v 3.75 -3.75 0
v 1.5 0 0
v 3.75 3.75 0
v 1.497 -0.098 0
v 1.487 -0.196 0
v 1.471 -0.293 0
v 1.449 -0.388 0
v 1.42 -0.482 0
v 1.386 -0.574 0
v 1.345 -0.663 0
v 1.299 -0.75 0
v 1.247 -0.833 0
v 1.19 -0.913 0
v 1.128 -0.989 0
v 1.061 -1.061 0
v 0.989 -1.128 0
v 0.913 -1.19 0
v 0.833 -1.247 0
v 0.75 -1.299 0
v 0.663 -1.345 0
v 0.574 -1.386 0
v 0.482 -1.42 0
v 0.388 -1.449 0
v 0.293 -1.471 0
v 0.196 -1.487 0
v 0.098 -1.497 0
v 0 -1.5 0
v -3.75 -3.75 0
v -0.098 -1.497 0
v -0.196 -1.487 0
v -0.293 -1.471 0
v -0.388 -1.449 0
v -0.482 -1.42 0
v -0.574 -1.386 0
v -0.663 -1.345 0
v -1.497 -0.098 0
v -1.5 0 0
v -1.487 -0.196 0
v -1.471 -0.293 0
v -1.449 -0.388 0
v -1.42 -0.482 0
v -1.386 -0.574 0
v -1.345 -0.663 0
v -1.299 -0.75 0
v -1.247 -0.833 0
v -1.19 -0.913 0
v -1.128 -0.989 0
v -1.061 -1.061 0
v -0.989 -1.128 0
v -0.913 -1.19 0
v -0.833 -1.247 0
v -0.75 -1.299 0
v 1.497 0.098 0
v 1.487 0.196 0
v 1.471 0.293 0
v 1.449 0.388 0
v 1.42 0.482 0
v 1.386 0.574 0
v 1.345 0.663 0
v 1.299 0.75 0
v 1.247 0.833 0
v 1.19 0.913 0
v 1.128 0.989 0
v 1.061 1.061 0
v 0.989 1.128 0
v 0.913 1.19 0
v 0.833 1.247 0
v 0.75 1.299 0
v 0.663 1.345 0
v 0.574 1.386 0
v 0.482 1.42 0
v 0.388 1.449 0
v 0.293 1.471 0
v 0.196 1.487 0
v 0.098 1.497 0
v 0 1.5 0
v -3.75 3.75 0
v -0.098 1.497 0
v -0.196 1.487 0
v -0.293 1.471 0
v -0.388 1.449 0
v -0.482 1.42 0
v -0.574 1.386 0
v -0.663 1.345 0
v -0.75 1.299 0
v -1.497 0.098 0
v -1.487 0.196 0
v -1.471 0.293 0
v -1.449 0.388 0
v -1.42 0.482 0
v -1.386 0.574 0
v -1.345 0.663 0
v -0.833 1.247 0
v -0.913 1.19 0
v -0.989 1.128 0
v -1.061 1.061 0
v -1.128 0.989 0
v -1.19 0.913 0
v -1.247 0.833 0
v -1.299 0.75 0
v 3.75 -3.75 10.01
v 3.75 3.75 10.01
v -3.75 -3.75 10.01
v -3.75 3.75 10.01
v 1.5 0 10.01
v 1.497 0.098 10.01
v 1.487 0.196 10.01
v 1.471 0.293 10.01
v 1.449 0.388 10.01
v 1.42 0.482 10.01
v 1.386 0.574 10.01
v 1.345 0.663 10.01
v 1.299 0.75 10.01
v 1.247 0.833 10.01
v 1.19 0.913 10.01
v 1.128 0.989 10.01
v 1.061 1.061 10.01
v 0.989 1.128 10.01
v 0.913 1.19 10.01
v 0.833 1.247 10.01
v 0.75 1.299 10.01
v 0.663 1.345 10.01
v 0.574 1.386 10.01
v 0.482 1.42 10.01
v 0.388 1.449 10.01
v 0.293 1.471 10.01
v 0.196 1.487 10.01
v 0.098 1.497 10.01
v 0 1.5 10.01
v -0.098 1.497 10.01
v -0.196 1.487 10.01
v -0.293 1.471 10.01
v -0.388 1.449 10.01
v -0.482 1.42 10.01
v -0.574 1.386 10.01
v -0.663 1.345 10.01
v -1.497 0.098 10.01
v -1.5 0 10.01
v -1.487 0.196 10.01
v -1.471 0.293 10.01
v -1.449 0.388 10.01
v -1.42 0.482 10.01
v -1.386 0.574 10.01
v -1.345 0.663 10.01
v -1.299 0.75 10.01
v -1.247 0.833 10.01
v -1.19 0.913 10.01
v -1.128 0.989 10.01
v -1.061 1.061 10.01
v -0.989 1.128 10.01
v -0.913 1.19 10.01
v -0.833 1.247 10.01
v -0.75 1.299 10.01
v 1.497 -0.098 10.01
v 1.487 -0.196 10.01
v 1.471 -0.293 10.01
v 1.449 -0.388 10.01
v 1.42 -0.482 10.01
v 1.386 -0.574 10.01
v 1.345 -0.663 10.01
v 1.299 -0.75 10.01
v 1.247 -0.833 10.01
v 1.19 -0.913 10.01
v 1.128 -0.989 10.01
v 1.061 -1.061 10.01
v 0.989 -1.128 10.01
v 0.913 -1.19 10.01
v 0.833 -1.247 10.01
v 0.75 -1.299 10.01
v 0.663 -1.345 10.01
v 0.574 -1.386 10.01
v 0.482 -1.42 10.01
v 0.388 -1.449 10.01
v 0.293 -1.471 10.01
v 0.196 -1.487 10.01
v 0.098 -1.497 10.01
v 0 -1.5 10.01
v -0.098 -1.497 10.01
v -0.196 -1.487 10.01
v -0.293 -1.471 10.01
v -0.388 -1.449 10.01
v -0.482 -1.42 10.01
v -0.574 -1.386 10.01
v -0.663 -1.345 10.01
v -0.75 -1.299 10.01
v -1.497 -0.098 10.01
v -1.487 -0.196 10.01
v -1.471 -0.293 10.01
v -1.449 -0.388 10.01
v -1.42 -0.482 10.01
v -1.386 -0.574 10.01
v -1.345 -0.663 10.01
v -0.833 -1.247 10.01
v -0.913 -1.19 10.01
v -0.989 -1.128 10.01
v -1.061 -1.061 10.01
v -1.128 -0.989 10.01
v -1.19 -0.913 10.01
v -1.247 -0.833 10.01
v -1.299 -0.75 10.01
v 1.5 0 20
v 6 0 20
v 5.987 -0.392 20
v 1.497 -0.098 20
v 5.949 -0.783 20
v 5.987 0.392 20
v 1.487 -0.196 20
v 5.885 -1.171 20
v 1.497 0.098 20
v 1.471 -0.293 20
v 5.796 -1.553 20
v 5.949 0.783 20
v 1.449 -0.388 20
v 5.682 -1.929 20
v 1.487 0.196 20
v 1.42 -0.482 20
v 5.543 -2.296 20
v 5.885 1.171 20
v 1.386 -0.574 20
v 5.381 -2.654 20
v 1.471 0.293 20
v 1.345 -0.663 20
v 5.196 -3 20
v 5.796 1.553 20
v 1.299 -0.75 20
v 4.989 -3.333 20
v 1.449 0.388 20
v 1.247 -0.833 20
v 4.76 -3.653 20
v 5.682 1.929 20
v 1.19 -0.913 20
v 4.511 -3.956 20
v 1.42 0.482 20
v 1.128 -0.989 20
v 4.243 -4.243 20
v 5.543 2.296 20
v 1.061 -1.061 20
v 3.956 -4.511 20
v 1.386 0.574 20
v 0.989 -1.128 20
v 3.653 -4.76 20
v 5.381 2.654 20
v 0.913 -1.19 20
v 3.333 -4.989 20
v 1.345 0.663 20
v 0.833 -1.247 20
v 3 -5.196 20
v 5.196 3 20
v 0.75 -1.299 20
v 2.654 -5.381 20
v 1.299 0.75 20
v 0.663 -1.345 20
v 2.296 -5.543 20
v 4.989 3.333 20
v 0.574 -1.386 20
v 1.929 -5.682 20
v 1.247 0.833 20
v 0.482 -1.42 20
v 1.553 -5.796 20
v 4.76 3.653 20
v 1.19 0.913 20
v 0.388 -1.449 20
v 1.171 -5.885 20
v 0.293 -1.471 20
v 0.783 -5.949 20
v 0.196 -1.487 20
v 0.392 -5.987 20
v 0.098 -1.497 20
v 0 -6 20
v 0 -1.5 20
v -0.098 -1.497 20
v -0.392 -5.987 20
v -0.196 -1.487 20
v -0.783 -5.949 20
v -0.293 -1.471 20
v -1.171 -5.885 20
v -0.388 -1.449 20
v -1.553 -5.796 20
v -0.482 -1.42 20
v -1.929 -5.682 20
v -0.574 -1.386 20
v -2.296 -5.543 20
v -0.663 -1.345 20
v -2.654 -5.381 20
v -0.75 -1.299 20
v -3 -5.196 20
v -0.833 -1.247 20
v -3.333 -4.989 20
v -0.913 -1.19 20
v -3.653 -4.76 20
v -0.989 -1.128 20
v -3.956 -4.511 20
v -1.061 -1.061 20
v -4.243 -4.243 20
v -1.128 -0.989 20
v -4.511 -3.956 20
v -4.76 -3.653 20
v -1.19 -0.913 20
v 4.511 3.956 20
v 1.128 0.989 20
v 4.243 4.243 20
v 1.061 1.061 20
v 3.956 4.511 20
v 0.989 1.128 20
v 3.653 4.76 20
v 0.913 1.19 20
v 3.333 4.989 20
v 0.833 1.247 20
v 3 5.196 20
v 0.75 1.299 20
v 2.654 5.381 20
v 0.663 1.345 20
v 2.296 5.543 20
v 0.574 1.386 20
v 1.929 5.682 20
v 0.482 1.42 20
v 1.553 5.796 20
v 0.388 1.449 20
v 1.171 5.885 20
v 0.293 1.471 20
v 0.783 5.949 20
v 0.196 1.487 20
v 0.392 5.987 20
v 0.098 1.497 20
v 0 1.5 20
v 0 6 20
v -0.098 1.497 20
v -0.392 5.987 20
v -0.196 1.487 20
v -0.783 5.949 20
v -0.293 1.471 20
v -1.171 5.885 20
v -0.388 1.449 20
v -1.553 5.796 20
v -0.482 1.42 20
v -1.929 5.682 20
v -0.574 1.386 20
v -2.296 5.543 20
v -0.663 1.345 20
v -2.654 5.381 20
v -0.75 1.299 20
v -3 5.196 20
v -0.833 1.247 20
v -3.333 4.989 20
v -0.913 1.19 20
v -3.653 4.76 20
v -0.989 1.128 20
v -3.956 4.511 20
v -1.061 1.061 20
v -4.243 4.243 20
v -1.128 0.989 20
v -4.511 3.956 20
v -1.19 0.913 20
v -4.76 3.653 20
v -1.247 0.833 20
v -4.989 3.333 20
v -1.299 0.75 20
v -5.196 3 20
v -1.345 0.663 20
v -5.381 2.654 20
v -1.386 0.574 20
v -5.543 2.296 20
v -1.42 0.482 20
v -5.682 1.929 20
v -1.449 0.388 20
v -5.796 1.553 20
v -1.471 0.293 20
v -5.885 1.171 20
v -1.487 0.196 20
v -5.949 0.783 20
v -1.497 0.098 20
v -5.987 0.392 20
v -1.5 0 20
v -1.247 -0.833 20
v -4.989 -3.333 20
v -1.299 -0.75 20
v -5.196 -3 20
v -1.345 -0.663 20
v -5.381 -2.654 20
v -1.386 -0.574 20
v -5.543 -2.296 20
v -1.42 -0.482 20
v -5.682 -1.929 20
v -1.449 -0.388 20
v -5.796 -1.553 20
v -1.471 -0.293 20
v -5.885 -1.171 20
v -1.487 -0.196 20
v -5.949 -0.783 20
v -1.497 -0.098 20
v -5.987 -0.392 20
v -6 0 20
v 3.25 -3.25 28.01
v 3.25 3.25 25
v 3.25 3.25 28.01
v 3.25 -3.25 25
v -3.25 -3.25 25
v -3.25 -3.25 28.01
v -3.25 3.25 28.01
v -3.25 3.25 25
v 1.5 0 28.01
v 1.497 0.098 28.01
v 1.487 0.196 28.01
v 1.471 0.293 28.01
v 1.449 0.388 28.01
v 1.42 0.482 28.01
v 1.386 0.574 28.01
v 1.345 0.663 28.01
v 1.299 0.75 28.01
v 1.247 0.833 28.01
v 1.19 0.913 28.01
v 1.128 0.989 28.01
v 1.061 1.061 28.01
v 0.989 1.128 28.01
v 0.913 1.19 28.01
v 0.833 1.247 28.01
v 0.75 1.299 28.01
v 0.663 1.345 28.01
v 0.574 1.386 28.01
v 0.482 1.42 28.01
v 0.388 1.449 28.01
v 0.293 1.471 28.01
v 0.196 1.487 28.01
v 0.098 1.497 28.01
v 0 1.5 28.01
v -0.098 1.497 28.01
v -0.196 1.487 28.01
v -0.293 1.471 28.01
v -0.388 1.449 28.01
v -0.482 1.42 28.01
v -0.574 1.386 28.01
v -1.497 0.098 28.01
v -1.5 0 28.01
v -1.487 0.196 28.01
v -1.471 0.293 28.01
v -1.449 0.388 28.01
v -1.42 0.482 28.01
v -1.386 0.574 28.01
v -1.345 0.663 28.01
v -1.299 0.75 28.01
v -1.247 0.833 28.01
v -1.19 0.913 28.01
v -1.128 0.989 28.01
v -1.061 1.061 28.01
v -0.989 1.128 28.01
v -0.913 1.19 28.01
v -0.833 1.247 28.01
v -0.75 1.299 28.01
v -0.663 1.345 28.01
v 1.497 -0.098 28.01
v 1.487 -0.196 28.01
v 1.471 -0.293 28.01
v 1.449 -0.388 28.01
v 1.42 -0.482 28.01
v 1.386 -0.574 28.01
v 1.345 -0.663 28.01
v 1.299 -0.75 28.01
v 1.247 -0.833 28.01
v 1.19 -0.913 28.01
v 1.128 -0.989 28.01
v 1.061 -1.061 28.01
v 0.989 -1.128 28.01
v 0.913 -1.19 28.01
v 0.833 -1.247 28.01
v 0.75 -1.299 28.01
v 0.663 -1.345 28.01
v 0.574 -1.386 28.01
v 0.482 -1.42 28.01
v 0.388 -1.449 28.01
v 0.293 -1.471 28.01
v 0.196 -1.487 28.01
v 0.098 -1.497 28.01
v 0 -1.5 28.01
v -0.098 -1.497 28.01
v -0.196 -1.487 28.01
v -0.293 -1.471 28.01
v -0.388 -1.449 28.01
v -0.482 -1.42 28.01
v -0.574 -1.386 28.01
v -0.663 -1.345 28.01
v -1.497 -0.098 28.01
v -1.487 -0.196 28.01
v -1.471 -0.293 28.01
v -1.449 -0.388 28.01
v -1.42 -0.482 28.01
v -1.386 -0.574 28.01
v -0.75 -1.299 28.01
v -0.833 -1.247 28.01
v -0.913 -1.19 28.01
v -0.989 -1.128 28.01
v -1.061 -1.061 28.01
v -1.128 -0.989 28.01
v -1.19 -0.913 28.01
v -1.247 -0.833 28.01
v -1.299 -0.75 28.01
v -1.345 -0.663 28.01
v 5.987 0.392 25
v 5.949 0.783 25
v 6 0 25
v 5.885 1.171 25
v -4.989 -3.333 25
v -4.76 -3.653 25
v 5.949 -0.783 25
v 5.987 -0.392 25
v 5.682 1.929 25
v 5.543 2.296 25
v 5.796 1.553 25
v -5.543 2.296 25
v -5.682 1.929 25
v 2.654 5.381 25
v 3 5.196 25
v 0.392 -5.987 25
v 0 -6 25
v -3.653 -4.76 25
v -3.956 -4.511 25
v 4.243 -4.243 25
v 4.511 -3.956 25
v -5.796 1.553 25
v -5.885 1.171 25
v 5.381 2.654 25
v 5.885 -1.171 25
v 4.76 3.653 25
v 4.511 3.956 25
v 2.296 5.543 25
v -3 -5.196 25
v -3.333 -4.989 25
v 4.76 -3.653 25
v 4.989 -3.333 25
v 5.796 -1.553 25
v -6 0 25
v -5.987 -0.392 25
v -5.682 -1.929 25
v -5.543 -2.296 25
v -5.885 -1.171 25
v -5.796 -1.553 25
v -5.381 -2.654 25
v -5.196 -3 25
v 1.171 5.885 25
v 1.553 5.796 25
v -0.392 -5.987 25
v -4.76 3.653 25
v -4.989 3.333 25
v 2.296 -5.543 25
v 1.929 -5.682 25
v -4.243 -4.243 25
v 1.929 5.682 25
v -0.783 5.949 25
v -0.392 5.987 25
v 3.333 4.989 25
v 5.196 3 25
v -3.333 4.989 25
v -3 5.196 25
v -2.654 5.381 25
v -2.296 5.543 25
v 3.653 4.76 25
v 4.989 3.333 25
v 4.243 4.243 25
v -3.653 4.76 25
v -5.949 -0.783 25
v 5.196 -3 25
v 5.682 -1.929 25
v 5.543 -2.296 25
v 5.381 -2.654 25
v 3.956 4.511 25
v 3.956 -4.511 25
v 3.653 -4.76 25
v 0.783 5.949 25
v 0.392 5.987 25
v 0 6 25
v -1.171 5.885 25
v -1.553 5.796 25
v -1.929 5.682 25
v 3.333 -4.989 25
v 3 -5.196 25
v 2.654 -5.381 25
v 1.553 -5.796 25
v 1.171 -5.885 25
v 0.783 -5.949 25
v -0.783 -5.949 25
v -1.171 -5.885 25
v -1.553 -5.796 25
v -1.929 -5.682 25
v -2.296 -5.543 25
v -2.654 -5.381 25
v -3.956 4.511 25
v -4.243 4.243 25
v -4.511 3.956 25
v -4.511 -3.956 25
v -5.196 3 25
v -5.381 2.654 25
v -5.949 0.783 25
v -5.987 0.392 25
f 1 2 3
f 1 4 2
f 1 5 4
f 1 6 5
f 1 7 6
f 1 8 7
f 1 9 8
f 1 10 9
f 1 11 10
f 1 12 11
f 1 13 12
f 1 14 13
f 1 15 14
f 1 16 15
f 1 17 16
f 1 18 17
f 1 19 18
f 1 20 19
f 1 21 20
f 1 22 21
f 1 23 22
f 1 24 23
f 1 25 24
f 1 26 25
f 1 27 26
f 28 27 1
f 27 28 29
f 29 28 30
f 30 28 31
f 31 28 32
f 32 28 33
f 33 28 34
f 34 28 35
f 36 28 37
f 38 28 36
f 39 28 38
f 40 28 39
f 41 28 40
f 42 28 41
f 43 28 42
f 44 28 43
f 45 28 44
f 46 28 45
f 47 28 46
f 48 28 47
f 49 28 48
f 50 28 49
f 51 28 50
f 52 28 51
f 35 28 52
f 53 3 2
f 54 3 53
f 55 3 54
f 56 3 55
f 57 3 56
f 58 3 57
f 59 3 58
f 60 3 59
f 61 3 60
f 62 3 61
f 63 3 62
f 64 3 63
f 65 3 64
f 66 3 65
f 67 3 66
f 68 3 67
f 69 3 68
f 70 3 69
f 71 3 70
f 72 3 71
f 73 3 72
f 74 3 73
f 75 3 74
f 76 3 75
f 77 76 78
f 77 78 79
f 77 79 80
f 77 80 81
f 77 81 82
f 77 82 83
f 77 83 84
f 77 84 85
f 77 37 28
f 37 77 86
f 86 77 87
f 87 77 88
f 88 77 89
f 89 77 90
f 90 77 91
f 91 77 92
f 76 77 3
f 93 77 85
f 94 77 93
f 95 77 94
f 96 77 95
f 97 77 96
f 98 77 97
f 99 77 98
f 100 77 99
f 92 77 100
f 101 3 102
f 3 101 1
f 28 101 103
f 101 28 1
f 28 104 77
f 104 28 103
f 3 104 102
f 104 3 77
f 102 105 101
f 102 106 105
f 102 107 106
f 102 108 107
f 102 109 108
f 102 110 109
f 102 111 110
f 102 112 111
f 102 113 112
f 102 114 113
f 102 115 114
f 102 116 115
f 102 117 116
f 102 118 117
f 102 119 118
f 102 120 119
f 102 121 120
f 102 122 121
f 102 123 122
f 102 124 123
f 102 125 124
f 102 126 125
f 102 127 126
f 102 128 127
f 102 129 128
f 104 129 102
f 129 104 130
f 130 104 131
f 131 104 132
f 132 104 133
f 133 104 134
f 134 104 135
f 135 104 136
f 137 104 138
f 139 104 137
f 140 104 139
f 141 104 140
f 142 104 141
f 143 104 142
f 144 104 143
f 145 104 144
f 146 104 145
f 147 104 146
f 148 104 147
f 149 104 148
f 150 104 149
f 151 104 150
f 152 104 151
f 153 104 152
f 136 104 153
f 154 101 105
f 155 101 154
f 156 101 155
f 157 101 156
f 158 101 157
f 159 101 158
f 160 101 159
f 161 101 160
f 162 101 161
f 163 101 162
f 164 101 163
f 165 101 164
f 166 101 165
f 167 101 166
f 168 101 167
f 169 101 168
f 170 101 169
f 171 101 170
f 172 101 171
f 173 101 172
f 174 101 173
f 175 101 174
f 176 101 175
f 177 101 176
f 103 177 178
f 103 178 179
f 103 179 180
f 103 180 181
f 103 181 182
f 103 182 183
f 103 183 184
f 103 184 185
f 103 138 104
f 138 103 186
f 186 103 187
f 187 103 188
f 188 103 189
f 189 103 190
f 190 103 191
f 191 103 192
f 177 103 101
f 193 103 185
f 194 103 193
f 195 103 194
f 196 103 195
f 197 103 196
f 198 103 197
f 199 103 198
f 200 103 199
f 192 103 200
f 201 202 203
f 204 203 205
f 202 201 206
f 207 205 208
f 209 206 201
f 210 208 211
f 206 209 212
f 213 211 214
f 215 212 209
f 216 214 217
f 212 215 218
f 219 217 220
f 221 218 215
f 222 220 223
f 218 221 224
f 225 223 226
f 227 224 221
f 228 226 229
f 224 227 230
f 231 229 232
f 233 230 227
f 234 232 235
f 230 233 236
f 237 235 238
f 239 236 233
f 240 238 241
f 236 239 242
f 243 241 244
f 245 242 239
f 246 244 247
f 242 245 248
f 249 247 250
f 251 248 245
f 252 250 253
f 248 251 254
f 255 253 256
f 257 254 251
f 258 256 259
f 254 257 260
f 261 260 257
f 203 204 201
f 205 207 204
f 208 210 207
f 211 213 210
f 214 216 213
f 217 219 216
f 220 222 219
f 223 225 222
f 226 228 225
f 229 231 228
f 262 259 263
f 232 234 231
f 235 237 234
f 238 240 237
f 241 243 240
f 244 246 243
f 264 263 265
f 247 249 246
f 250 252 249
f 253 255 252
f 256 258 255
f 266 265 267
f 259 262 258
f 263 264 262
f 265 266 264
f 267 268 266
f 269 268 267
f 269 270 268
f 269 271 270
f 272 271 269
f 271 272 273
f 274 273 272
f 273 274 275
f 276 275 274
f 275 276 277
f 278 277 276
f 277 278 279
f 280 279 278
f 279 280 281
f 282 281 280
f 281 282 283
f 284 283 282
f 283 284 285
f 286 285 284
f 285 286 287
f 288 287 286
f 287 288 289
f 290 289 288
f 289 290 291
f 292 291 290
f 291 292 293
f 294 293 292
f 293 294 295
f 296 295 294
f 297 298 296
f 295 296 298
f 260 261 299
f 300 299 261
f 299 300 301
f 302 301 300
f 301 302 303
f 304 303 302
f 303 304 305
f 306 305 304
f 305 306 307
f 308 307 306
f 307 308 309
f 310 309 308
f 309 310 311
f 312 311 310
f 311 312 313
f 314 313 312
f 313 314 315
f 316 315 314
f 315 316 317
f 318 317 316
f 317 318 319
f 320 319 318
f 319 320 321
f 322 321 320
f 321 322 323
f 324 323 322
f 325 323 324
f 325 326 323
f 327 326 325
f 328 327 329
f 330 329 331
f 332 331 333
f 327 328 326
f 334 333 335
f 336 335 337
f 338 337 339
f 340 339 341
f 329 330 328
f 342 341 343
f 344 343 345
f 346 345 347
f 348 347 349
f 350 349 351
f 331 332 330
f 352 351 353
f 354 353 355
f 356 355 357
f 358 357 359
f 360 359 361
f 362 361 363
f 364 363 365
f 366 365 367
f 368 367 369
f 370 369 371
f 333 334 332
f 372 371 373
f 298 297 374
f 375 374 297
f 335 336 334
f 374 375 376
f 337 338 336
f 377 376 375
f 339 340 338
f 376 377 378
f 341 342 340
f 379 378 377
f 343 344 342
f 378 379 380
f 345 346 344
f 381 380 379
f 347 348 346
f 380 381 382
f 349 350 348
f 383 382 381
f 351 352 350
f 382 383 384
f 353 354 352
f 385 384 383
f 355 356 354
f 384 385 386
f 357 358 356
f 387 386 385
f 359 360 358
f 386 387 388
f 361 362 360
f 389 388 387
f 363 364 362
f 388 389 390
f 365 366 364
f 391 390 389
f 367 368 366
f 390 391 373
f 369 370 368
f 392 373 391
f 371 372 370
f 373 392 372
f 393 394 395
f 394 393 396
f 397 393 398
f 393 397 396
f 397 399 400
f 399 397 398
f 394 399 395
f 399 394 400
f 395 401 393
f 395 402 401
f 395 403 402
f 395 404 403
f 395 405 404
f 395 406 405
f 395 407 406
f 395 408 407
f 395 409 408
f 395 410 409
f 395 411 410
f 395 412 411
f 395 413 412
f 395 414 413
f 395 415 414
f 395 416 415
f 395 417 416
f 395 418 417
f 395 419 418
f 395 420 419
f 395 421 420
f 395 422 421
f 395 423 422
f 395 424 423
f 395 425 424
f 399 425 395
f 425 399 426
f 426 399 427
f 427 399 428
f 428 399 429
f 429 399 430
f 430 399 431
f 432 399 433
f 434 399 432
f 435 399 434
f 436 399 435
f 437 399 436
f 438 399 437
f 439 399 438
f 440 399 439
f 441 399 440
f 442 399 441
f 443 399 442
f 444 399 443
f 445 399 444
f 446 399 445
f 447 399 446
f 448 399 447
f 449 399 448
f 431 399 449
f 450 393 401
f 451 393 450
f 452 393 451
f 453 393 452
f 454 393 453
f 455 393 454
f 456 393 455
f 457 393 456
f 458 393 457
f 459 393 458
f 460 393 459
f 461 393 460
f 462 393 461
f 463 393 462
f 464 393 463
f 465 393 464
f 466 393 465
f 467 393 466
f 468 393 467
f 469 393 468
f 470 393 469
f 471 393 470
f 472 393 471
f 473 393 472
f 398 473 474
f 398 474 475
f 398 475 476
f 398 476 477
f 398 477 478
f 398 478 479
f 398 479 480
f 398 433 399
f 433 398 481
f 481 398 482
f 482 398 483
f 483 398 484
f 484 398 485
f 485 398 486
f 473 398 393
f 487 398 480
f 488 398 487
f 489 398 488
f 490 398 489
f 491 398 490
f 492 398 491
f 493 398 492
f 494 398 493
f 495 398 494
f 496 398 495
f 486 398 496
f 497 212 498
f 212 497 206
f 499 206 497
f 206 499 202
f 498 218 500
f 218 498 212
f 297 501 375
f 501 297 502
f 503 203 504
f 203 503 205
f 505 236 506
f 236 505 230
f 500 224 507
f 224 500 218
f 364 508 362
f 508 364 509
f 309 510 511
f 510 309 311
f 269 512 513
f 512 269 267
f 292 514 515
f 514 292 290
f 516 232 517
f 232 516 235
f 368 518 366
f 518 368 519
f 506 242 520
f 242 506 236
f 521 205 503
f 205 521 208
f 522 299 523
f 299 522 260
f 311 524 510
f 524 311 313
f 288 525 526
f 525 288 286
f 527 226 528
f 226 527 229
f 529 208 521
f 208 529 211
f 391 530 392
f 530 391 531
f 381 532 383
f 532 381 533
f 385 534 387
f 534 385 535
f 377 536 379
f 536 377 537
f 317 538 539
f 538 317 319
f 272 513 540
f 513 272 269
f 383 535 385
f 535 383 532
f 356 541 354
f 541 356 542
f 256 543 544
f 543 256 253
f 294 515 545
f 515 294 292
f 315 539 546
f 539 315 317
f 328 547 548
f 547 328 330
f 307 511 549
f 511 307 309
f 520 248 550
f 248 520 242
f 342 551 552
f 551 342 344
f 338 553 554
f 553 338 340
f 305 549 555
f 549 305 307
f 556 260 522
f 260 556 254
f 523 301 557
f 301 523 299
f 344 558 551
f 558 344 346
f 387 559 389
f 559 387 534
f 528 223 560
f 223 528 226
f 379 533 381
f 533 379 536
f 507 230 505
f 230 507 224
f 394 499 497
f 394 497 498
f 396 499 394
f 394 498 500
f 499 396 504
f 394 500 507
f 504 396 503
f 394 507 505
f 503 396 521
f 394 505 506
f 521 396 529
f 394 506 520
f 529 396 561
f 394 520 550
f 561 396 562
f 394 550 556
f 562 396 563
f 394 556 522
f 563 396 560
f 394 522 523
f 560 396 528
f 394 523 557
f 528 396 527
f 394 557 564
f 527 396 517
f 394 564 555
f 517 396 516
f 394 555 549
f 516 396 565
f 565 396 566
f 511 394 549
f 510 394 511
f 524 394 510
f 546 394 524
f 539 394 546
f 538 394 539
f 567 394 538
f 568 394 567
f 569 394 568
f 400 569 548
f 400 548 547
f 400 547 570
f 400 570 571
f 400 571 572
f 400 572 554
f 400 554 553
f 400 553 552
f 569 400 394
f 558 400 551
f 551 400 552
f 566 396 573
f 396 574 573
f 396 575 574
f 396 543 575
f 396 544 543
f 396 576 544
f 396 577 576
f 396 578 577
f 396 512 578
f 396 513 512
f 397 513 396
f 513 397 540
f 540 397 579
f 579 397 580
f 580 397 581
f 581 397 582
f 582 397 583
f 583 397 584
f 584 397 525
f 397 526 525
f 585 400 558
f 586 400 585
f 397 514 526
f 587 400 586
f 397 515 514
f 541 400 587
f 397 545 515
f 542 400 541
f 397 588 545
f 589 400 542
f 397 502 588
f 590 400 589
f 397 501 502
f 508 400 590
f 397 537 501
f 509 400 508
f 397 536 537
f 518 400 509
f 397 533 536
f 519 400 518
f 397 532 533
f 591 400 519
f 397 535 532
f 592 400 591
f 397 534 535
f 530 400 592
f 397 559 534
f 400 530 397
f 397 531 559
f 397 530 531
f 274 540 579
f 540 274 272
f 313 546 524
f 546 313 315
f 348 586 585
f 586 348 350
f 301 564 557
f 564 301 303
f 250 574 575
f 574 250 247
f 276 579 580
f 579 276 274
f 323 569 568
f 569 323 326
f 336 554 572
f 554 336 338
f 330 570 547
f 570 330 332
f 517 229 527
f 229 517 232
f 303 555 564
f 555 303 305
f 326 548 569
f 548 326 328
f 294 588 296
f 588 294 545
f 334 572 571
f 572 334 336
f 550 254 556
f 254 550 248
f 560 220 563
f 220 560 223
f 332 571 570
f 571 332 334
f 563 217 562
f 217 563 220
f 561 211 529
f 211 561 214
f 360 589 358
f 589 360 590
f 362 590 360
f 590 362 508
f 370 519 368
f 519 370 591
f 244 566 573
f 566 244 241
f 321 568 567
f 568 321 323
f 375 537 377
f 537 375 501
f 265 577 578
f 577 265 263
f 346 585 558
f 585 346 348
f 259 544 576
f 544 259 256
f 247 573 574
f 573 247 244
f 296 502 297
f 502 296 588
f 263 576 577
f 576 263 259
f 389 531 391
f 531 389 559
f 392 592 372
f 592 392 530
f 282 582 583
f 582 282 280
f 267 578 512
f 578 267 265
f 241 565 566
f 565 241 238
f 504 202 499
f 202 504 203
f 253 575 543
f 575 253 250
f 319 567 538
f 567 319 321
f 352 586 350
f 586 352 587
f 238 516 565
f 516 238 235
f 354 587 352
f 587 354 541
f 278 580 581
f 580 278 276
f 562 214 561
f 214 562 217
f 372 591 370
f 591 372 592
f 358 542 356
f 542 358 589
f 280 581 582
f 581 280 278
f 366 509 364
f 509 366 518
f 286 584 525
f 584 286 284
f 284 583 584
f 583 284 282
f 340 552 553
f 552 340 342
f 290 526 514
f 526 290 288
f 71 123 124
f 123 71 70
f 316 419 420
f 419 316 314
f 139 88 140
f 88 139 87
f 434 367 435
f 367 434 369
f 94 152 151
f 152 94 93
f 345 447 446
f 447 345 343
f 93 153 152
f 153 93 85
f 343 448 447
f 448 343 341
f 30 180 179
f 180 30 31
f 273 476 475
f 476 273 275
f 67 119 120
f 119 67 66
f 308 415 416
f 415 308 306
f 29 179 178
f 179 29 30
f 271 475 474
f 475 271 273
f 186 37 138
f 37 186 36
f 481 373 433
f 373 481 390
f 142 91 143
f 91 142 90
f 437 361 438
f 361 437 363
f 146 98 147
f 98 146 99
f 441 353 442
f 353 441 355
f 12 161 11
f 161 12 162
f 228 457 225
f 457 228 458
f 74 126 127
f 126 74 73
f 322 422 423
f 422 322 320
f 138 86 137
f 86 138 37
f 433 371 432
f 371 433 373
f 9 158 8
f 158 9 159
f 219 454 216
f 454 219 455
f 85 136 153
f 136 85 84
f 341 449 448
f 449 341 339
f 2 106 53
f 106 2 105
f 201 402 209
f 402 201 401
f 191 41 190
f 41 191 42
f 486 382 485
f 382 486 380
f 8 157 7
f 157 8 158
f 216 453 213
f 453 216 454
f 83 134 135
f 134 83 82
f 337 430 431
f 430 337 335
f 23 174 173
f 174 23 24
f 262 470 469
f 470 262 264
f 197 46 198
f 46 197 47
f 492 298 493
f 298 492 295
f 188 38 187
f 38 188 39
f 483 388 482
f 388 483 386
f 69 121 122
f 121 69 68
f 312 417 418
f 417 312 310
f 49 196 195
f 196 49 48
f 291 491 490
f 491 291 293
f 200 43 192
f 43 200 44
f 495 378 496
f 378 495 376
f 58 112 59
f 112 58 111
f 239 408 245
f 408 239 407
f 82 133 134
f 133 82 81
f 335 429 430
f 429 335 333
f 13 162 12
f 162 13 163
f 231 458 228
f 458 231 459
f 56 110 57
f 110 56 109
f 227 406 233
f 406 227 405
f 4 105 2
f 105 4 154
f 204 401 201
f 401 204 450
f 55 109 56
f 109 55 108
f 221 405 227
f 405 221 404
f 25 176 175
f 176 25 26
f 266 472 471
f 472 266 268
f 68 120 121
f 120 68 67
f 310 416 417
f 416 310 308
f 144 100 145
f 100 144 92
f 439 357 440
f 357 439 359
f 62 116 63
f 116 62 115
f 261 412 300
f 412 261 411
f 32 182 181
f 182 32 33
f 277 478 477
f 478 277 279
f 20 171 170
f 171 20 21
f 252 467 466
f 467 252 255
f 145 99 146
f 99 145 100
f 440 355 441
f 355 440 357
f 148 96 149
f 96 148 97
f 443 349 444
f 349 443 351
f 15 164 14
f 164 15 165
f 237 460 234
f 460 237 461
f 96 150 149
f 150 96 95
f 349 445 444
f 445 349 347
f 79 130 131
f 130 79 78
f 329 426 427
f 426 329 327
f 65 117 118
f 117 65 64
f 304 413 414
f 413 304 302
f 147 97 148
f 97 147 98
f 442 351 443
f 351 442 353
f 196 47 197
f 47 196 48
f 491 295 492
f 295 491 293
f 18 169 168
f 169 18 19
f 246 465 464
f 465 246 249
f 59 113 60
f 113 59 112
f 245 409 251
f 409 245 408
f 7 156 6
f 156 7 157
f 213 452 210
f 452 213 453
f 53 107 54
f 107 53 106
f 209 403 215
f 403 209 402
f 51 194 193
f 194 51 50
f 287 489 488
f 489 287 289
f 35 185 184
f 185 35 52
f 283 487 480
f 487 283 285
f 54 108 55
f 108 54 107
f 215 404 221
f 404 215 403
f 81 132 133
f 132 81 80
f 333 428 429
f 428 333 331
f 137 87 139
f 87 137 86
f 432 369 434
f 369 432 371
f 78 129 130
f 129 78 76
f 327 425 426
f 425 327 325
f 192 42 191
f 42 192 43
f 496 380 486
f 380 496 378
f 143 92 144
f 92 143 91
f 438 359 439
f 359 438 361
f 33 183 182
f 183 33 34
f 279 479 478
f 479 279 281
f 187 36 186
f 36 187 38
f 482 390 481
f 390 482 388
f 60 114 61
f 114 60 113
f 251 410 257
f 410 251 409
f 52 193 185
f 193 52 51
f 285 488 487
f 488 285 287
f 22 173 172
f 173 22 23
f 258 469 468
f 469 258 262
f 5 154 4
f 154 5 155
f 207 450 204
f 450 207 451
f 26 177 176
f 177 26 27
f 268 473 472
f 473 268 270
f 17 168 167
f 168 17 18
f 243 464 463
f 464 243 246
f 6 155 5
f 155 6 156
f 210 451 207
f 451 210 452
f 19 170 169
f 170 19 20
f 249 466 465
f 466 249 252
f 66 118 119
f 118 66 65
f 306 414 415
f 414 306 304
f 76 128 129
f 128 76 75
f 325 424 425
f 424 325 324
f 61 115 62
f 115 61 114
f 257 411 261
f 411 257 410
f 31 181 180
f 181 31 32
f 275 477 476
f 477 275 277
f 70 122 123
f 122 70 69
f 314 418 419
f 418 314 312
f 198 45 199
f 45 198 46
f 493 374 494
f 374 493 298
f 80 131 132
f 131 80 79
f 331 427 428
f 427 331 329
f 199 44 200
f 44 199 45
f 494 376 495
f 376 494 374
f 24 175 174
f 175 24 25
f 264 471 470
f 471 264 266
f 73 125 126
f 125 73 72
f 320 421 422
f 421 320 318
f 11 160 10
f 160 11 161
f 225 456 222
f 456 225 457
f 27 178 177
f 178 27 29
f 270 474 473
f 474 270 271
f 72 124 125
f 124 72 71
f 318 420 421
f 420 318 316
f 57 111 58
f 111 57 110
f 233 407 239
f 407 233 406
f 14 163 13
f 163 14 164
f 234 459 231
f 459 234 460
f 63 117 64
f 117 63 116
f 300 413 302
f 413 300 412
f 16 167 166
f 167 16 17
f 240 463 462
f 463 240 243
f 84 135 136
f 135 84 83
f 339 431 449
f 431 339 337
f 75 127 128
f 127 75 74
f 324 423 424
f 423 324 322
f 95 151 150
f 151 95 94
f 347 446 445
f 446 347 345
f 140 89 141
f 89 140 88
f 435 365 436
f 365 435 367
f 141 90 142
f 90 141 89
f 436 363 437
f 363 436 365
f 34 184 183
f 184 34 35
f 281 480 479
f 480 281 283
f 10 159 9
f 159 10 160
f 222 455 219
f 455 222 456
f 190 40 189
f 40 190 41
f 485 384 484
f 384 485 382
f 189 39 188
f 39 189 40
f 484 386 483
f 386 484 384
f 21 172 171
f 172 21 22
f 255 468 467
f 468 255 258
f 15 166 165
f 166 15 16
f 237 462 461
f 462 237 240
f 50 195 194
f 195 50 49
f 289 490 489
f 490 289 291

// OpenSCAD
// Hose-barb reducer: 8 mm ID tubing to 5 mm ID tubing
// Print orientation: standing upright along Z, centred on origin in X/Y

$fn = 96;

// ---- Dimensions (mm) ----
eps      = 0.5;     // cutter overshoot
barb_h8  = 10;      // height of each 8 mm barb
od8_bot  = 7.5;     // outer diameter of 8 mm barb at bottom
od8_top  = 9.5;     // outer diameter of 8 mm barb at top
collar_d = 12;      // diameter of cylindrical collar
barb_h5  = 8;       // height of each 5 mm barb
od5_bot  = 6.5;     // outer diameter of 5 mm barb at bottom
od5_top  = 5.0;     // outer diameter of 5 mm barb at top
bore     = 3;       // central through-bore diameter
length8  = 20;      // z extent of 8 mm tubing section
length5  = 16;      // z extent of 5 mm tubing section (z = 25 to 41)
overlap  = 0.01;    // small overlap between stacked barbs for clean union

// ---- Model ----
difference() {
    union() {
        // 8 mm tubing section: two stacked barbs with sawtooth profile
        for (i = [-1, 1])
            translate([0, 0, i > 0 ? overlap : 0])
                linear_extrude(height = barb_h8)
                    polygon([
                        [-od8_bot / 2, -od8_bot / 2],
                        [ od8_bot / 2, -od8_bot / 2],
                        [ od8_bot / 2, od8_bot / 2],
                        [-od8_bot / 2, od8_bot / 2]
                    ]);
        // collar
        translate([0, 0, length8])
            cylinder(d = collar_d, h = 5);
        // 5 mm tubing section: two stacked barbs, shrinking OD
        for (i = [-1, 1])
            translate([0, 0, length8 + (i > 0 ? overlap : 0)])
                linear_extrude(height = barb_h5)
                    polygon([
                        [-od5_bot / 2, -od5_bot / 2],
                        [ od5_bot / 2, -od5_bot / 2],
                        [ od5_bot / 2, od5_bot / 2],
                        [-od5_bot / 2, od5_bot / 2]
                    ]);
    }
    // central bore through full length
    translate([0, 0, -eps])
        cylinder(d = bore, h = length8 + 5 + length5 + 2 * eps);
}
